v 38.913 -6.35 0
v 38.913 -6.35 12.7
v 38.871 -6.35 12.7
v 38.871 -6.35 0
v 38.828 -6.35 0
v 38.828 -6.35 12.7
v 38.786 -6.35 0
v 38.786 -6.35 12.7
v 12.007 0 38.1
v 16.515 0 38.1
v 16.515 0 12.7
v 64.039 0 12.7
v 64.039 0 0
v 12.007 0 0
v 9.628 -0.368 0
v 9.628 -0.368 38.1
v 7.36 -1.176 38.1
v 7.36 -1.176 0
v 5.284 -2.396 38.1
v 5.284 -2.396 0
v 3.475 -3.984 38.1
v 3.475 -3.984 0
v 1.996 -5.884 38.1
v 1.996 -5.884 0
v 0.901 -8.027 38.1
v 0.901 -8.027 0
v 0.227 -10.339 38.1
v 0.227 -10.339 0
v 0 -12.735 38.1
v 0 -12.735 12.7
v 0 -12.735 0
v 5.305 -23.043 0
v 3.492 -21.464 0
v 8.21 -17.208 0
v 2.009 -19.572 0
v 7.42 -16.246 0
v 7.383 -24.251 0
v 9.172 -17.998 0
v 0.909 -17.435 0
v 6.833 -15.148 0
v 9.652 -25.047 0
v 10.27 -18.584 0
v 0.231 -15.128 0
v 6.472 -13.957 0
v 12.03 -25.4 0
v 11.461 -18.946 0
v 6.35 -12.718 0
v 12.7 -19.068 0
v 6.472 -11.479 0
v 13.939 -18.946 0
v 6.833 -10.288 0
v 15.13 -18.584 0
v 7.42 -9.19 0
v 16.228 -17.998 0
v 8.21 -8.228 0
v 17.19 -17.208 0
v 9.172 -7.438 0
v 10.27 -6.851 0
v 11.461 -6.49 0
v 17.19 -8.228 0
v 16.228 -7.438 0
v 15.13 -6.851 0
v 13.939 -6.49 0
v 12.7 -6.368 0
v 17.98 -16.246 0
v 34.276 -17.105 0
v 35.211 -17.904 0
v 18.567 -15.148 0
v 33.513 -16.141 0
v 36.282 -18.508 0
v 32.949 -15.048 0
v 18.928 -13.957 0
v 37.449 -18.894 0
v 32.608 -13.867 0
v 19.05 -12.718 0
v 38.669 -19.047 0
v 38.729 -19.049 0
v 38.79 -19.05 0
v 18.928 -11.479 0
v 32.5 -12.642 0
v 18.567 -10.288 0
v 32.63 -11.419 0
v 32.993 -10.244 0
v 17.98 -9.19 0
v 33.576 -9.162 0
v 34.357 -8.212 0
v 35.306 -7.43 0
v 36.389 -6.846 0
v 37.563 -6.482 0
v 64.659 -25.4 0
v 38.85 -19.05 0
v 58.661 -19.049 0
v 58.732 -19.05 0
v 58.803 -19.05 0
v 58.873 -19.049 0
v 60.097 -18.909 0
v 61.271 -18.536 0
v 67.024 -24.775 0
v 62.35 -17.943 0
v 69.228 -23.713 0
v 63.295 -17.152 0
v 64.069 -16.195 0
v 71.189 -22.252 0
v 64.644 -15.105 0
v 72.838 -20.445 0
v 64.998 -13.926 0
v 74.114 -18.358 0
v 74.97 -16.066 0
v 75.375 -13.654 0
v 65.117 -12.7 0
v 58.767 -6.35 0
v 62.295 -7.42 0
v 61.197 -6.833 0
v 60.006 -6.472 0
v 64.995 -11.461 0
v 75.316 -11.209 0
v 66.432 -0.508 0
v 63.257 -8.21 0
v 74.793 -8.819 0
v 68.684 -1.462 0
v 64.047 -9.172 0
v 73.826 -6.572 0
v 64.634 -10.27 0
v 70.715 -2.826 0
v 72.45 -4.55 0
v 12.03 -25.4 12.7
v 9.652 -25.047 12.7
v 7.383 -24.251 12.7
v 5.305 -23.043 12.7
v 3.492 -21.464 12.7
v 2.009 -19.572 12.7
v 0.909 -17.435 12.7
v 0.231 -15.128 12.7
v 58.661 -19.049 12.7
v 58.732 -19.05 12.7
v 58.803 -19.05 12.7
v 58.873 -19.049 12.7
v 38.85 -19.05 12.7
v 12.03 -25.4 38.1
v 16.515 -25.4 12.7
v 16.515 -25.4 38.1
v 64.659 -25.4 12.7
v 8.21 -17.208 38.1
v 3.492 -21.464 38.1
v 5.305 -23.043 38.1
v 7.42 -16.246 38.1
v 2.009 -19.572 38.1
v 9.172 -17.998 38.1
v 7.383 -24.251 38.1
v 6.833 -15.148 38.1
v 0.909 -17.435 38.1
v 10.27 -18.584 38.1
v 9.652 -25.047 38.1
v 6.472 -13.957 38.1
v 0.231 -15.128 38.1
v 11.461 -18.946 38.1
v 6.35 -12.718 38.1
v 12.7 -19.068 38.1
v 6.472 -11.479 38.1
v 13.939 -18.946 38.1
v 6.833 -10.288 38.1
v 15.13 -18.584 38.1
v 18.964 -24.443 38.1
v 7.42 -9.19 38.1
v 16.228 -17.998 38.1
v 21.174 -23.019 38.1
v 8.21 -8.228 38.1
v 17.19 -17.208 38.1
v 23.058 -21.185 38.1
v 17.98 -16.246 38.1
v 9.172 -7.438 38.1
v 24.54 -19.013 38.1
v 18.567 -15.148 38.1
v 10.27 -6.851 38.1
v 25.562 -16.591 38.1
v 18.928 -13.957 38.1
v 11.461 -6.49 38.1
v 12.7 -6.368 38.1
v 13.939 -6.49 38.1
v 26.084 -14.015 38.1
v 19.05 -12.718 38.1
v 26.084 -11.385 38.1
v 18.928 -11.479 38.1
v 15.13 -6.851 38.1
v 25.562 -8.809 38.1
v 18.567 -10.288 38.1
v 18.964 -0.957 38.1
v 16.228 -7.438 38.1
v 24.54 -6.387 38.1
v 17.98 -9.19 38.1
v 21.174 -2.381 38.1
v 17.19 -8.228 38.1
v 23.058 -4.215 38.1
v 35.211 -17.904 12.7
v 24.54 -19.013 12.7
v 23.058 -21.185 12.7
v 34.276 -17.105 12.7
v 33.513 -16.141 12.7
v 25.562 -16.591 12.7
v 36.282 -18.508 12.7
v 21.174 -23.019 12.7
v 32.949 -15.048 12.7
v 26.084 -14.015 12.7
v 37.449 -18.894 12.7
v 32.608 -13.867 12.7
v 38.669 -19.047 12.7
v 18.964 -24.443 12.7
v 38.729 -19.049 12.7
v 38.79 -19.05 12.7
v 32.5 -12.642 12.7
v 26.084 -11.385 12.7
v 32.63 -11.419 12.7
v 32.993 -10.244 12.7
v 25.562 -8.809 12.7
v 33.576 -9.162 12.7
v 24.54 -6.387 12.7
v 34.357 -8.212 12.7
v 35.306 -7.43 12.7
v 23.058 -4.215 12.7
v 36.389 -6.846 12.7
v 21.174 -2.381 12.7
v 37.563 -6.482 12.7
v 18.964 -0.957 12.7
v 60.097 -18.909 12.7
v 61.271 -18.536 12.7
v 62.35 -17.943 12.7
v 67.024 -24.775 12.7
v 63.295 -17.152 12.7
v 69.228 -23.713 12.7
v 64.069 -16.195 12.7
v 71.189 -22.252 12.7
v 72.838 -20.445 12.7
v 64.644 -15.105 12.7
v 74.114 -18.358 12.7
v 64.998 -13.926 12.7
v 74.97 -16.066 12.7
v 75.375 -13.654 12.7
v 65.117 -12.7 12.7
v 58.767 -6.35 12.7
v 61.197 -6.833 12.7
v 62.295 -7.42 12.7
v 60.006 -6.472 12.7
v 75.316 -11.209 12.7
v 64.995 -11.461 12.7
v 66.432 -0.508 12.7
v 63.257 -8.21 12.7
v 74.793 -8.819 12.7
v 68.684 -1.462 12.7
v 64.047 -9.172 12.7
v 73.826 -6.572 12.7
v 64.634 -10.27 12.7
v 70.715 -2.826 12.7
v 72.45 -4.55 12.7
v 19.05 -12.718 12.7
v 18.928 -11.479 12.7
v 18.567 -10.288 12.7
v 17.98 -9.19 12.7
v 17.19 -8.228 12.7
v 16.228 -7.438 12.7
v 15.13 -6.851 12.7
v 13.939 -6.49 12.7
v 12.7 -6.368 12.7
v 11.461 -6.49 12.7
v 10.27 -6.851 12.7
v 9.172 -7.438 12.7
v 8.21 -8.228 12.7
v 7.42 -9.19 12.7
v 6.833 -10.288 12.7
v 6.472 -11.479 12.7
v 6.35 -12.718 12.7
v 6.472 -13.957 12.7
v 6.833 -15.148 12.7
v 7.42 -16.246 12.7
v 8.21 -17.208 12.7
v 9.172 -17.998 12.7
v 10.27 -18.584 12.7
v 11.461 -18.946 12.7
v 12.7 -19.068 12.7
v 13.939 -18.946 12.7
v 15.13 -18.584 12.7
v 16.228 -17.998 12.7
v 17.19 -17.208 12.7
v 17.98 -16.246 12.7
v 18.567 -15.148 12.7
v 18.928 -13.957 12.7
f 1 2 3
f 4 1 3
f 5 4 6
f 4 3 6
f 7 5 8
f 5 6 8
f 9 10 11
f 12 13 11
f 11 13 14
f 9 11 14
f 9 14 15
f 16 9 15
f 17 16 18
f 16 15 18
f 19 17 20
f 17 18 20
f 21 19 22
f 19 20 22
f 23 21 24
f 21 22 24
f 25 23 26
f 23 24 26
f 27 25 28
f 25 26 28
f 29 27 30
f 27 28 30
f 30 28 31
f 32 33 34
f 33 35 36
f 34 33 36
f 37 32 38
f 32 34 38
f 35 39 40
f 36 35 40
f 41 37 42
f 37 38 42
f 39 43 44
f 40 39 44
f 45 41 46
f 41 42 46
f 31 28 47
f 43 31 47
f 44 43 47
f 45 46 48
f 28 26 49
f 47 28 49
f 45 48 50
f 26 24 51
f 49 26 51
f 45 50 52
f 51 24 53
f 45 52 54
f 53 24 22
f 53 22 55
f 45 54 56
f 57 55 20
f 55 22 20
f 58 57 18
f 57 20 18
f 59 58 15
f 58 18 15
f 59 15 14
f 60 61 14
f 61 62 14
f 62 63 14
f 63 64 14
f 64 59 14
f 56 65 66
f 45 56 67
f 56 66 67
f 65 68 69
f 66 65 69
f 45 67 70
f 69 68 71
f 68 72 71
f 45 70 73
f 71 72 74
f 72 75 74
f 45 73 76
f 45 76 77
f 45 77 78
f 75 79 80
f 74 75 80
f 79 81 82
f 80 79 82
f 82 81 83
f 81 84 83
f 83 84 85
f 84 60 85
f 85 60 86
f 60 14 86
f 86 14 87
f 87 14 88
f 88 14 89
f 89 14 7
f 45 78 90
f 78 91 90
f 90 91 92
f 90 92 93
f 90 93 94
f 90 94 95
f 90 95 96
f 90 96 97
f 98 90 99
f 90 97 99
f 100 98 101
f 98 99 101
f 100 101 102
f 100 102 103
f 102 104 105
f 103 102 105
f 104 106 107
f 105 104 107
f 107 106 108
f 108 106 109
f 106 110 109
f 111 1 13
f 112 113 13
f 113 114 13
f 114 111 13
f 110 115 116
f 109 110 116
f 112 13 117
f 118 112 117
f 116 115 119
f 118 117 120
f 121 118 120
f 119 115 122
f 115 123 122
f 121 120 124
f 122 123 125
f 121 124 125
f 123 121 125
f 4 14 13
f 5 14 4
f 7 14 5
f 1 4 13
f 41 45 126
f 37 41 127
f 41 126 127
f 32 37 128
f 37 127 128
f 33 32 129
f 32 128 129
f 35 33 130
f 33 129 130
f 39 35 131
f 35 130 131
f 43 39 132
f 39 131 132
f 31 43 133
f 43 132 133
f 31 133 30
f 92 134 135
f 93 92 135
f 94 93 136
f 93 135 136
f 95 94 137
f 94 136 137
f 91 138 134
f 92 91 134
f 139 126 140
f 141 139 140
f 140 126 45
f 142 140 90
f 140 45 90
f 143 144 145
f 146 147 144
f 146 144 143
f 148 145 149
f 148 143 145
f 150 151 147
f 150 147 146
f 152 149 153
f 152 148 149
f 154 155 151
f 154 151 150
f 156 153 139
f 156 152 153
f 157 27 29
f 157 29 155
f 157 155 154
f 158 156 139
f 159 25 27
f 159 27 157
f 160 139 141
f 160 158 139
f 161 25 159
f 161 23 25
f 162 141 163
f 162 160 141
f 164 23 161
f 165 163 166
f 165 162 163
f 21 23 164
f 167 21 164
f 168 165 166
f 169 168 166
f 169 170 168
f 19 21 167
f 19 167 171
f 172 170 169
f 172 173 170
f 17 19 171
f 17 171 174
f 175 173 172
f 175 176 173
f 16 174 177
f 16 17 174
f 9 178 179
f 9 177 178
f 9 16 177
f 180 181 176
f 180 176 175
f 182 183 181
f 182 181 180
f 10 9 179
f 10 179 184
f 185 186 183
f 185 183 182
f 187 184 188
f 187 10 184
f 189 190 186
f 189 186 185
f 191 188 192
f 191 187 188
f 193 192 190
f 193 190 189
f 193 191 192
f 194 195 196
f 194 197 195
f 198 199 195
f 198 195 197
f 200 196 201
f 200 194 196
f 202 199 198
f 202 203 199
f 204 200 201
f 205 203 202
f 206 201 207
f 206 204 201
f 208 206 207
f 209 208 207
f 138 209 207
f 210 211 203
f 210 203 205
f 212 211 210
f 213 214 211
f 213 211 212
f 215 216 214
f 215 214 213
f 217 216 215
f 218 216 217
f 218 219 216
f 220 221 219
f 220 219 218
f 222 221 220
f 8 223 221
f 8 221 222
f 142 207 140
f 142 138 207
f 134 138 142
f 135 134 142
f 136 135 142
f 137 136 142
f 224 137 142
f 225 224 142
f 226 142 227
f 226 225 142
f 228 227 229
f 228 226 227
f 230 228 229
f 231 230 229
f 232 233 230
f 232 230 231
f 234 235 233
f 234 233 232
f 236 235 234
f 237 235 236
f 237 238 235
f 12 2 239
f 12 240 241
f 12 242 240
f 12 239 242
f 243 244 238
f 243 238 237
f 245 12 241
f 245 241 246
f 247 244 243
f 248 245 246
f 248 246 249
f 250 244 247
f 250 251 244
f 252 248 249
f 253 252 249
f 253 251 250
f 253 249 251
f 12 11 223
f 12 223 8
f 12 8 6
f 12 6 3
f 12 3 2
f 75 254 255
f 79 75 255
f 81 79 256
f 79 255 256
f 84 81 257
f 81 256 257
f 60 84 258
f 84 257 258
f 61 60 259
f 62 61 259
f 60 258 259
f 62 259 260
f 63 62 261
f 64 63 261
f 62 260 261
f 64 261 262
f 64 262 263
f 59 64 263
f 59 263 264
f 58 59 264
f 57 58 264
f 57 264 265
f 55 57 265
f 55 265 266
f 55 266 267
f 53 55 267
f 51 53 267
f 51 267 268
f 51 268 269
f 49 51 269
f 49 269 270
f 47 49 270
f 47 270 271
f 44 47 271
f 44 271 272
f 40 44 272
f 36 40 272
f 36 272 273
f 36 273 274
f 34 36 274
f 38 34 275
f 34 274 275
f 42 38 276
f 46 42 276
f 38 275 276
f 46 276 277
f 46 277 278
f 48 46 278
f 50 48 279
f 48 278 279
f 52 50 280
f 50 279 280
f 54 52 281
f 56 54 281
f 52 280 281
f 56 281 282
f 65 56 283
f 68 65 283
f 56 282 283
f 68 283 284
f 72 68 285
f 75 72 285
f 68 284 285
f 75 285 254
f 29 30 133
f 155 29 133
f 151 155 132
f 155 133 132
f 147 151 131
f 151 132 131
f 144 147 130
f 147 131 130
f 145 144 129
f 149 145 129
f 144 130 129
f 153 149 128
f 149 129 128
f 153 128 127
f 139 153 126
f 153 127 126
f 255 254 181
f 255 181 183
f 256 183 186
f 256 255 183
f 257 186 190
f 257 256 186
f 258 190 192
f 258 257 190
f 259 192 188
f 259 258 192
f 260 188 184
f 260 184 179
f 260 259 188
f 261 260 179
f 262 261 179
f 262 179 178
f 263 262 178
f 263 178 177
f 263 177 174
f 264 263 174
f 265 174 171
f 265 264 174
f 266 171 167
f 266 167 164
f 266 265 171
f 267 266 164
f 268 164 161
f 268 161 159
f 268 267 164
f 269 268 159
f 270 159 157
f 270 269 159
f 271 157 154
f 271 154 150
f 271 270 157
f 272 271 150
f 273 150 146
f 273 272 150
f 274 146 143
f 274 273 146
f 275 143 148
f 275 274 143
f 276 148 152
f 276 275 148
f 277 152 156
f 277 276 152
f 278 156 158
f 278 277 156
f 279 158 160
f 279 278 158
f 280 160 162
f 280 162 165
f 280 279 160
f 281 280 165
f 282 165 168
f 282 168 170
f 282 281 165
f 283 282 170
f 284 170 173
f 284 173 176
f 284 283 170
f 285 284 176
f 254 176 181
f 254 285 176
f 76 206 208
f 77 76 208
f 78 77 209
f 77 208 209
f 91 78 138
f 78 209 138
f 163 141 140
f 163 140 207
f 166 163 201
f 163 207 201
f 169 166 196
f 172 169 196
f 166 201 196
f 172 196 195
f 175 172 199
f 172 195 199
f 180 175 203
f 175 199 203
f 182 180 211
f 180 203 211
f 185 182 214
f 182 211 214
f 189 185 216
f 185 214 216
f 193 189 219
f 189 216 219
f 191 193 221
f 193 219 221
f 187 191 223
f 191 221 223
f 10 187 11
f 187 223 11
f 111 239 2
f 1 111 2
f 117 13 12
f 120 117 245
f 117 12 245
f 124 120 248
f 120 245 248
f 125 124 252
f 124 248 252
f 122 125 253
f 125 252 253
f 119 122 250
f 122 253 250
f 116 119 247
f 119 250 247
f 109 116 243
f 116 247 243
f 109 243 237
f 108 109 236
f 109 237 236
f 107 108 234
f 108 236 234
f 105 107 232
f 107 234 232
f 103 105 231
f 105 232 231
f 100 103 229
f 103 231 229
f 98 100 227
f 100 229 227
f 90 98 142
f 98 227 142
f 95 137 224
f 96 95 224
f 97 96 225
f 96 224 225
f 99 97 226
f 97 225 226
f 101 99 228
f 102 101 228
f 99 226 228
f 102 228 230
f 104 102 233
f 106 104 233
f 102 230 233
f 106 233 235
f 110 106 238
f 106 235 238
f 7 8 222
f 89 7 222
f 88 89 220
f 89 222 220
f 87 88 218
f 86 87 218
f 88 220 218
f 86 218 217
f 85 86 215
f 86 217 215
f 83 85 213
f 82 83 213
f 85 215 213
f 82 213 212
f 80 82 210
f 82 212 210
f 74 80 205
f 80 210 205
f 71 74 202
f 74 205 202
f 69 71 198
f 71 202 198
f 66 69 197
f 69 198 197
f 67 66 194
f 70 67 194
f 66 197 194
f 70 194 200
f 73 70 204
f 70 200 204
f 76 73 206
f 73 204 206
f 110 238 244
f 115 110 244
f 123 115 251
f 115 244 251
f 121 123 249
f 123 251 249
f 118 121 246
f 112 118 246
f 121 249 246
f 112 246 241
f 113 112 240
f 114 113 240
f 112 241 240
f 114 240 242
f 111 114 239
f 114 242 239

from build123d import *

# Parameters (mm, degrees)
F0_W      = 76.2
F0_H      = 12.7
F1_DEPTH  = 25.4
F3_DEPTH  = 25.4
F4_R      = 6.35
F5_DEPTH  = 50.8
F7_DEPTH  = 25.4
F8_R      = 6.35
F10_DEPTH = 25.4
F12_DEPTH = 25.4
F13_DEPTH = 25.4


# Not quite as in the source:
# - ends of sketch curves that miss each other by under 0.0002 mm in the source are joined


with BuildPart() as f1:
    # F0 (on Front) → F1 (new body)
    with BuildSketch(Plane.XZ):
        with Locations((38.1, 6.35)):
            Rectangle(F0_W, F0_H)
    extrude(amount=F1_DEPTH)

    # F2 (on face) → F3 (cut)
    with BuildSketch(Plane.XY.offset(12.7)):
        with BuildLine():
            ThreePointArc((64.0390142798, 0), (75.4038787349, -12.4300591202), (64.6592453122, -25.4))
            Line((64.6592453122, -25.4), (76.2, -25.4))
            Line((76.2, -25.4), (76.2, 0))
            Line((76.2, 0), (64.0390142798, 0))
        make_face()
    extrude(amount=-F3_DEPTH, mode=Mode.SUBTRACT)

    # F4 (on face) → F5 (cut)
    with BuildSketch(Plane.XY.offset(12.7)):
        with BuildLine():
            ThreePointArc((12.0300554493, -25.4), (3.4859185716, -21.4578724796), (-1.23091e-05, -12.717681963))
            Line((-1.23091e-05, -12.717681963), (0, -25.4))
            Line((0, -25.4), (12.0300554493, -25.4))
        make_face()
        with Locations((12.6999876909, -12.717681963)):
            Circle(F4_R)
    extrude(amount=-F5_DEPTH, mode=Mode.SUBTRACT)

    # F6 (on face) → F7 (cut)
    with BuildSketch(Plane.XY.offset(12.7)):
        with BuildLine():
            ThreePointArc((0, -12.735363926), (3.4749459355, -3.9839181288), (12.0067364357, 0))
            Line((12.0067364357, 0), (0, 0))
            Line((0, 0), (0, -12.735363926))
        make_face()
    extrude(amount=-F7_DEPTH, mode=Mode.SUBTRACT)

    # F8 (on face) → F10 (join)
    with BuildSketch(Plane.XY.offset(12.7)):
        with BuildLine():
            Line((12.0300554493, -25.4), (16.5153164417, -25.4))
            ThreePointArc((16.5153164417, -25.4), (26.1494098267, -12.7), (16.5153164417, 0))
            Line((16.5153164417, 0), (12.0067364357, 0))
            ThreePointArc((12.0067364357, 0), (3.4749459355, -3.9839181288), (0, -12.735363926))
            ThreePointArc((0, -12.735363926), (3.4920052044, -21.4642846479), (12.0300554493, -25.4))
        make_face()
        with Locations((12.6999876909, -12.717681963)):
            Circle(F8_R, mode=Mode.SUBTRACT)
    extrude(amount=F10_DEPTH)

    # F11 (on face) → F12 (cut)
    with BuildSketch(Plane.XY.offset(12.7)):
        with BuildLine():
            Line((39.0294717837, -19.0474465489), (58.5869699212, -19.0474465489))
            ThreePointArc((58.5869699212, -19.0474465489), (52.4176695499, -12.6100109835), (58.7669298396, -6.3500000008))
            Line((58.7669298396, -6.3500000008), (38.9130622506, -6.3503190341))
            ThreePointArc((38.9130622506, -6.3503190341), (43.361986302, -8.2324331506), (45.1994098267, -12.7))
            ThreePointArc((45.1994098267, -12.7), (43.4027543902, -17.126008731), (39.0294717837, -19.0474465489))
        make_face()
        with BuildLine():
            Line((38.6693478697, -19.0474465489), (39.0294717837, -19.0474465489))
            ThreePointArc((39.0294717837, -19.0474465489), (43.4027543902, -17.126008731), (45.1994098267, -12.7))
            ThreePointArc((45.1994098267, -12.7), (43.361986302, -8.2324331506), (38.9130622506, -6.3503190341))
            ThreePointArc((38.9130622506, -6.3503190341), (38.8493077881, -6.3500000008), (38.7855533359, -6.350321083))
            ThreePointArc((38.7855533359, -6.350321083), (32.4996757514, -12.6418865466), (38.6693478697, -19.0474465489))
        make_face()
    extrude(amount=-F12_DEPTH, mode=Mode.SUBTRACT)

    # F9 (on face) → F13 (cut)
    with BuildSketch(Plane.XY.offset(12.7)):
        with BuildLine():
            Line((38.9130622506, -6.3503190341), (38.7855533359, -6.350321083))
            ThreePointArc((38.7855533359, -6.350321083), (32.4994908094, -12.7320698283), (38.8496921889, -19.0499999937))
            ThreePointArc((38.8496921889, -19.0499999937), (43.3396377163, -17.1900282293), (45.1994098267, -12.7))
            ThreePointArc((45.1994098267, -12.7), (43.361986302, -8.2324331506), (38.9130622506, -6.3503190341))
        make_face()
        with BuildLine():
            ThreePointArc((45.1994098267, -12.7), (43.3396377163, -17.1900282293), (38.8496921889, -19.0499999937))
            Line((38.8496921889, -19.0499999937), (58.6612614637, -19.0491190428))
            ThreePointArc((58.6612614637, -19.0491190428), (52.4172516966, -12.6471639759), (58.7669298396, -6.3500000008))
            Line((58.7669298396, -6.3500000008), (38.9130622506, -6.3503190341))
            ThreePointArc((38.9130622506, -6.3503190341), (43.361986302, -8.2324331506), (45.1994098267, -12.7))
        make_face()
        with BuildLine():
            Line((58.8733669384, -19.0491096112), (58.6612614637, -19.0491190428))
            ThreePointArc((58.6612614637, -19.0491190428), (58.7673142404, -19.0499999937), (58.8733669384, -19.0491096112))
        make_face()
        with BuildLine():
            ThreePointArc((58.7669298396, -6.3500000008), (52.4172516966, -12.6471639759), (58.6612614637, -19.0491190428))
            Line((58.6612614637, -19.0491190428), (58.8733669384, -19.0491096112))
            ThreePointArc((58.8733669384, -19.0491096112), (63.294598975, -17.1523742188), (65.1170318782, -12.7))
            ThreePointArc((65.1170318782, -12.7), (63.2571238625, -8.2098358635), (58.7669298396, -6.3500000008))
        make_face()
    extrude(amount=-F13_DEPTH, mode=Mode.SUBTRACT)


solid = f1.part
